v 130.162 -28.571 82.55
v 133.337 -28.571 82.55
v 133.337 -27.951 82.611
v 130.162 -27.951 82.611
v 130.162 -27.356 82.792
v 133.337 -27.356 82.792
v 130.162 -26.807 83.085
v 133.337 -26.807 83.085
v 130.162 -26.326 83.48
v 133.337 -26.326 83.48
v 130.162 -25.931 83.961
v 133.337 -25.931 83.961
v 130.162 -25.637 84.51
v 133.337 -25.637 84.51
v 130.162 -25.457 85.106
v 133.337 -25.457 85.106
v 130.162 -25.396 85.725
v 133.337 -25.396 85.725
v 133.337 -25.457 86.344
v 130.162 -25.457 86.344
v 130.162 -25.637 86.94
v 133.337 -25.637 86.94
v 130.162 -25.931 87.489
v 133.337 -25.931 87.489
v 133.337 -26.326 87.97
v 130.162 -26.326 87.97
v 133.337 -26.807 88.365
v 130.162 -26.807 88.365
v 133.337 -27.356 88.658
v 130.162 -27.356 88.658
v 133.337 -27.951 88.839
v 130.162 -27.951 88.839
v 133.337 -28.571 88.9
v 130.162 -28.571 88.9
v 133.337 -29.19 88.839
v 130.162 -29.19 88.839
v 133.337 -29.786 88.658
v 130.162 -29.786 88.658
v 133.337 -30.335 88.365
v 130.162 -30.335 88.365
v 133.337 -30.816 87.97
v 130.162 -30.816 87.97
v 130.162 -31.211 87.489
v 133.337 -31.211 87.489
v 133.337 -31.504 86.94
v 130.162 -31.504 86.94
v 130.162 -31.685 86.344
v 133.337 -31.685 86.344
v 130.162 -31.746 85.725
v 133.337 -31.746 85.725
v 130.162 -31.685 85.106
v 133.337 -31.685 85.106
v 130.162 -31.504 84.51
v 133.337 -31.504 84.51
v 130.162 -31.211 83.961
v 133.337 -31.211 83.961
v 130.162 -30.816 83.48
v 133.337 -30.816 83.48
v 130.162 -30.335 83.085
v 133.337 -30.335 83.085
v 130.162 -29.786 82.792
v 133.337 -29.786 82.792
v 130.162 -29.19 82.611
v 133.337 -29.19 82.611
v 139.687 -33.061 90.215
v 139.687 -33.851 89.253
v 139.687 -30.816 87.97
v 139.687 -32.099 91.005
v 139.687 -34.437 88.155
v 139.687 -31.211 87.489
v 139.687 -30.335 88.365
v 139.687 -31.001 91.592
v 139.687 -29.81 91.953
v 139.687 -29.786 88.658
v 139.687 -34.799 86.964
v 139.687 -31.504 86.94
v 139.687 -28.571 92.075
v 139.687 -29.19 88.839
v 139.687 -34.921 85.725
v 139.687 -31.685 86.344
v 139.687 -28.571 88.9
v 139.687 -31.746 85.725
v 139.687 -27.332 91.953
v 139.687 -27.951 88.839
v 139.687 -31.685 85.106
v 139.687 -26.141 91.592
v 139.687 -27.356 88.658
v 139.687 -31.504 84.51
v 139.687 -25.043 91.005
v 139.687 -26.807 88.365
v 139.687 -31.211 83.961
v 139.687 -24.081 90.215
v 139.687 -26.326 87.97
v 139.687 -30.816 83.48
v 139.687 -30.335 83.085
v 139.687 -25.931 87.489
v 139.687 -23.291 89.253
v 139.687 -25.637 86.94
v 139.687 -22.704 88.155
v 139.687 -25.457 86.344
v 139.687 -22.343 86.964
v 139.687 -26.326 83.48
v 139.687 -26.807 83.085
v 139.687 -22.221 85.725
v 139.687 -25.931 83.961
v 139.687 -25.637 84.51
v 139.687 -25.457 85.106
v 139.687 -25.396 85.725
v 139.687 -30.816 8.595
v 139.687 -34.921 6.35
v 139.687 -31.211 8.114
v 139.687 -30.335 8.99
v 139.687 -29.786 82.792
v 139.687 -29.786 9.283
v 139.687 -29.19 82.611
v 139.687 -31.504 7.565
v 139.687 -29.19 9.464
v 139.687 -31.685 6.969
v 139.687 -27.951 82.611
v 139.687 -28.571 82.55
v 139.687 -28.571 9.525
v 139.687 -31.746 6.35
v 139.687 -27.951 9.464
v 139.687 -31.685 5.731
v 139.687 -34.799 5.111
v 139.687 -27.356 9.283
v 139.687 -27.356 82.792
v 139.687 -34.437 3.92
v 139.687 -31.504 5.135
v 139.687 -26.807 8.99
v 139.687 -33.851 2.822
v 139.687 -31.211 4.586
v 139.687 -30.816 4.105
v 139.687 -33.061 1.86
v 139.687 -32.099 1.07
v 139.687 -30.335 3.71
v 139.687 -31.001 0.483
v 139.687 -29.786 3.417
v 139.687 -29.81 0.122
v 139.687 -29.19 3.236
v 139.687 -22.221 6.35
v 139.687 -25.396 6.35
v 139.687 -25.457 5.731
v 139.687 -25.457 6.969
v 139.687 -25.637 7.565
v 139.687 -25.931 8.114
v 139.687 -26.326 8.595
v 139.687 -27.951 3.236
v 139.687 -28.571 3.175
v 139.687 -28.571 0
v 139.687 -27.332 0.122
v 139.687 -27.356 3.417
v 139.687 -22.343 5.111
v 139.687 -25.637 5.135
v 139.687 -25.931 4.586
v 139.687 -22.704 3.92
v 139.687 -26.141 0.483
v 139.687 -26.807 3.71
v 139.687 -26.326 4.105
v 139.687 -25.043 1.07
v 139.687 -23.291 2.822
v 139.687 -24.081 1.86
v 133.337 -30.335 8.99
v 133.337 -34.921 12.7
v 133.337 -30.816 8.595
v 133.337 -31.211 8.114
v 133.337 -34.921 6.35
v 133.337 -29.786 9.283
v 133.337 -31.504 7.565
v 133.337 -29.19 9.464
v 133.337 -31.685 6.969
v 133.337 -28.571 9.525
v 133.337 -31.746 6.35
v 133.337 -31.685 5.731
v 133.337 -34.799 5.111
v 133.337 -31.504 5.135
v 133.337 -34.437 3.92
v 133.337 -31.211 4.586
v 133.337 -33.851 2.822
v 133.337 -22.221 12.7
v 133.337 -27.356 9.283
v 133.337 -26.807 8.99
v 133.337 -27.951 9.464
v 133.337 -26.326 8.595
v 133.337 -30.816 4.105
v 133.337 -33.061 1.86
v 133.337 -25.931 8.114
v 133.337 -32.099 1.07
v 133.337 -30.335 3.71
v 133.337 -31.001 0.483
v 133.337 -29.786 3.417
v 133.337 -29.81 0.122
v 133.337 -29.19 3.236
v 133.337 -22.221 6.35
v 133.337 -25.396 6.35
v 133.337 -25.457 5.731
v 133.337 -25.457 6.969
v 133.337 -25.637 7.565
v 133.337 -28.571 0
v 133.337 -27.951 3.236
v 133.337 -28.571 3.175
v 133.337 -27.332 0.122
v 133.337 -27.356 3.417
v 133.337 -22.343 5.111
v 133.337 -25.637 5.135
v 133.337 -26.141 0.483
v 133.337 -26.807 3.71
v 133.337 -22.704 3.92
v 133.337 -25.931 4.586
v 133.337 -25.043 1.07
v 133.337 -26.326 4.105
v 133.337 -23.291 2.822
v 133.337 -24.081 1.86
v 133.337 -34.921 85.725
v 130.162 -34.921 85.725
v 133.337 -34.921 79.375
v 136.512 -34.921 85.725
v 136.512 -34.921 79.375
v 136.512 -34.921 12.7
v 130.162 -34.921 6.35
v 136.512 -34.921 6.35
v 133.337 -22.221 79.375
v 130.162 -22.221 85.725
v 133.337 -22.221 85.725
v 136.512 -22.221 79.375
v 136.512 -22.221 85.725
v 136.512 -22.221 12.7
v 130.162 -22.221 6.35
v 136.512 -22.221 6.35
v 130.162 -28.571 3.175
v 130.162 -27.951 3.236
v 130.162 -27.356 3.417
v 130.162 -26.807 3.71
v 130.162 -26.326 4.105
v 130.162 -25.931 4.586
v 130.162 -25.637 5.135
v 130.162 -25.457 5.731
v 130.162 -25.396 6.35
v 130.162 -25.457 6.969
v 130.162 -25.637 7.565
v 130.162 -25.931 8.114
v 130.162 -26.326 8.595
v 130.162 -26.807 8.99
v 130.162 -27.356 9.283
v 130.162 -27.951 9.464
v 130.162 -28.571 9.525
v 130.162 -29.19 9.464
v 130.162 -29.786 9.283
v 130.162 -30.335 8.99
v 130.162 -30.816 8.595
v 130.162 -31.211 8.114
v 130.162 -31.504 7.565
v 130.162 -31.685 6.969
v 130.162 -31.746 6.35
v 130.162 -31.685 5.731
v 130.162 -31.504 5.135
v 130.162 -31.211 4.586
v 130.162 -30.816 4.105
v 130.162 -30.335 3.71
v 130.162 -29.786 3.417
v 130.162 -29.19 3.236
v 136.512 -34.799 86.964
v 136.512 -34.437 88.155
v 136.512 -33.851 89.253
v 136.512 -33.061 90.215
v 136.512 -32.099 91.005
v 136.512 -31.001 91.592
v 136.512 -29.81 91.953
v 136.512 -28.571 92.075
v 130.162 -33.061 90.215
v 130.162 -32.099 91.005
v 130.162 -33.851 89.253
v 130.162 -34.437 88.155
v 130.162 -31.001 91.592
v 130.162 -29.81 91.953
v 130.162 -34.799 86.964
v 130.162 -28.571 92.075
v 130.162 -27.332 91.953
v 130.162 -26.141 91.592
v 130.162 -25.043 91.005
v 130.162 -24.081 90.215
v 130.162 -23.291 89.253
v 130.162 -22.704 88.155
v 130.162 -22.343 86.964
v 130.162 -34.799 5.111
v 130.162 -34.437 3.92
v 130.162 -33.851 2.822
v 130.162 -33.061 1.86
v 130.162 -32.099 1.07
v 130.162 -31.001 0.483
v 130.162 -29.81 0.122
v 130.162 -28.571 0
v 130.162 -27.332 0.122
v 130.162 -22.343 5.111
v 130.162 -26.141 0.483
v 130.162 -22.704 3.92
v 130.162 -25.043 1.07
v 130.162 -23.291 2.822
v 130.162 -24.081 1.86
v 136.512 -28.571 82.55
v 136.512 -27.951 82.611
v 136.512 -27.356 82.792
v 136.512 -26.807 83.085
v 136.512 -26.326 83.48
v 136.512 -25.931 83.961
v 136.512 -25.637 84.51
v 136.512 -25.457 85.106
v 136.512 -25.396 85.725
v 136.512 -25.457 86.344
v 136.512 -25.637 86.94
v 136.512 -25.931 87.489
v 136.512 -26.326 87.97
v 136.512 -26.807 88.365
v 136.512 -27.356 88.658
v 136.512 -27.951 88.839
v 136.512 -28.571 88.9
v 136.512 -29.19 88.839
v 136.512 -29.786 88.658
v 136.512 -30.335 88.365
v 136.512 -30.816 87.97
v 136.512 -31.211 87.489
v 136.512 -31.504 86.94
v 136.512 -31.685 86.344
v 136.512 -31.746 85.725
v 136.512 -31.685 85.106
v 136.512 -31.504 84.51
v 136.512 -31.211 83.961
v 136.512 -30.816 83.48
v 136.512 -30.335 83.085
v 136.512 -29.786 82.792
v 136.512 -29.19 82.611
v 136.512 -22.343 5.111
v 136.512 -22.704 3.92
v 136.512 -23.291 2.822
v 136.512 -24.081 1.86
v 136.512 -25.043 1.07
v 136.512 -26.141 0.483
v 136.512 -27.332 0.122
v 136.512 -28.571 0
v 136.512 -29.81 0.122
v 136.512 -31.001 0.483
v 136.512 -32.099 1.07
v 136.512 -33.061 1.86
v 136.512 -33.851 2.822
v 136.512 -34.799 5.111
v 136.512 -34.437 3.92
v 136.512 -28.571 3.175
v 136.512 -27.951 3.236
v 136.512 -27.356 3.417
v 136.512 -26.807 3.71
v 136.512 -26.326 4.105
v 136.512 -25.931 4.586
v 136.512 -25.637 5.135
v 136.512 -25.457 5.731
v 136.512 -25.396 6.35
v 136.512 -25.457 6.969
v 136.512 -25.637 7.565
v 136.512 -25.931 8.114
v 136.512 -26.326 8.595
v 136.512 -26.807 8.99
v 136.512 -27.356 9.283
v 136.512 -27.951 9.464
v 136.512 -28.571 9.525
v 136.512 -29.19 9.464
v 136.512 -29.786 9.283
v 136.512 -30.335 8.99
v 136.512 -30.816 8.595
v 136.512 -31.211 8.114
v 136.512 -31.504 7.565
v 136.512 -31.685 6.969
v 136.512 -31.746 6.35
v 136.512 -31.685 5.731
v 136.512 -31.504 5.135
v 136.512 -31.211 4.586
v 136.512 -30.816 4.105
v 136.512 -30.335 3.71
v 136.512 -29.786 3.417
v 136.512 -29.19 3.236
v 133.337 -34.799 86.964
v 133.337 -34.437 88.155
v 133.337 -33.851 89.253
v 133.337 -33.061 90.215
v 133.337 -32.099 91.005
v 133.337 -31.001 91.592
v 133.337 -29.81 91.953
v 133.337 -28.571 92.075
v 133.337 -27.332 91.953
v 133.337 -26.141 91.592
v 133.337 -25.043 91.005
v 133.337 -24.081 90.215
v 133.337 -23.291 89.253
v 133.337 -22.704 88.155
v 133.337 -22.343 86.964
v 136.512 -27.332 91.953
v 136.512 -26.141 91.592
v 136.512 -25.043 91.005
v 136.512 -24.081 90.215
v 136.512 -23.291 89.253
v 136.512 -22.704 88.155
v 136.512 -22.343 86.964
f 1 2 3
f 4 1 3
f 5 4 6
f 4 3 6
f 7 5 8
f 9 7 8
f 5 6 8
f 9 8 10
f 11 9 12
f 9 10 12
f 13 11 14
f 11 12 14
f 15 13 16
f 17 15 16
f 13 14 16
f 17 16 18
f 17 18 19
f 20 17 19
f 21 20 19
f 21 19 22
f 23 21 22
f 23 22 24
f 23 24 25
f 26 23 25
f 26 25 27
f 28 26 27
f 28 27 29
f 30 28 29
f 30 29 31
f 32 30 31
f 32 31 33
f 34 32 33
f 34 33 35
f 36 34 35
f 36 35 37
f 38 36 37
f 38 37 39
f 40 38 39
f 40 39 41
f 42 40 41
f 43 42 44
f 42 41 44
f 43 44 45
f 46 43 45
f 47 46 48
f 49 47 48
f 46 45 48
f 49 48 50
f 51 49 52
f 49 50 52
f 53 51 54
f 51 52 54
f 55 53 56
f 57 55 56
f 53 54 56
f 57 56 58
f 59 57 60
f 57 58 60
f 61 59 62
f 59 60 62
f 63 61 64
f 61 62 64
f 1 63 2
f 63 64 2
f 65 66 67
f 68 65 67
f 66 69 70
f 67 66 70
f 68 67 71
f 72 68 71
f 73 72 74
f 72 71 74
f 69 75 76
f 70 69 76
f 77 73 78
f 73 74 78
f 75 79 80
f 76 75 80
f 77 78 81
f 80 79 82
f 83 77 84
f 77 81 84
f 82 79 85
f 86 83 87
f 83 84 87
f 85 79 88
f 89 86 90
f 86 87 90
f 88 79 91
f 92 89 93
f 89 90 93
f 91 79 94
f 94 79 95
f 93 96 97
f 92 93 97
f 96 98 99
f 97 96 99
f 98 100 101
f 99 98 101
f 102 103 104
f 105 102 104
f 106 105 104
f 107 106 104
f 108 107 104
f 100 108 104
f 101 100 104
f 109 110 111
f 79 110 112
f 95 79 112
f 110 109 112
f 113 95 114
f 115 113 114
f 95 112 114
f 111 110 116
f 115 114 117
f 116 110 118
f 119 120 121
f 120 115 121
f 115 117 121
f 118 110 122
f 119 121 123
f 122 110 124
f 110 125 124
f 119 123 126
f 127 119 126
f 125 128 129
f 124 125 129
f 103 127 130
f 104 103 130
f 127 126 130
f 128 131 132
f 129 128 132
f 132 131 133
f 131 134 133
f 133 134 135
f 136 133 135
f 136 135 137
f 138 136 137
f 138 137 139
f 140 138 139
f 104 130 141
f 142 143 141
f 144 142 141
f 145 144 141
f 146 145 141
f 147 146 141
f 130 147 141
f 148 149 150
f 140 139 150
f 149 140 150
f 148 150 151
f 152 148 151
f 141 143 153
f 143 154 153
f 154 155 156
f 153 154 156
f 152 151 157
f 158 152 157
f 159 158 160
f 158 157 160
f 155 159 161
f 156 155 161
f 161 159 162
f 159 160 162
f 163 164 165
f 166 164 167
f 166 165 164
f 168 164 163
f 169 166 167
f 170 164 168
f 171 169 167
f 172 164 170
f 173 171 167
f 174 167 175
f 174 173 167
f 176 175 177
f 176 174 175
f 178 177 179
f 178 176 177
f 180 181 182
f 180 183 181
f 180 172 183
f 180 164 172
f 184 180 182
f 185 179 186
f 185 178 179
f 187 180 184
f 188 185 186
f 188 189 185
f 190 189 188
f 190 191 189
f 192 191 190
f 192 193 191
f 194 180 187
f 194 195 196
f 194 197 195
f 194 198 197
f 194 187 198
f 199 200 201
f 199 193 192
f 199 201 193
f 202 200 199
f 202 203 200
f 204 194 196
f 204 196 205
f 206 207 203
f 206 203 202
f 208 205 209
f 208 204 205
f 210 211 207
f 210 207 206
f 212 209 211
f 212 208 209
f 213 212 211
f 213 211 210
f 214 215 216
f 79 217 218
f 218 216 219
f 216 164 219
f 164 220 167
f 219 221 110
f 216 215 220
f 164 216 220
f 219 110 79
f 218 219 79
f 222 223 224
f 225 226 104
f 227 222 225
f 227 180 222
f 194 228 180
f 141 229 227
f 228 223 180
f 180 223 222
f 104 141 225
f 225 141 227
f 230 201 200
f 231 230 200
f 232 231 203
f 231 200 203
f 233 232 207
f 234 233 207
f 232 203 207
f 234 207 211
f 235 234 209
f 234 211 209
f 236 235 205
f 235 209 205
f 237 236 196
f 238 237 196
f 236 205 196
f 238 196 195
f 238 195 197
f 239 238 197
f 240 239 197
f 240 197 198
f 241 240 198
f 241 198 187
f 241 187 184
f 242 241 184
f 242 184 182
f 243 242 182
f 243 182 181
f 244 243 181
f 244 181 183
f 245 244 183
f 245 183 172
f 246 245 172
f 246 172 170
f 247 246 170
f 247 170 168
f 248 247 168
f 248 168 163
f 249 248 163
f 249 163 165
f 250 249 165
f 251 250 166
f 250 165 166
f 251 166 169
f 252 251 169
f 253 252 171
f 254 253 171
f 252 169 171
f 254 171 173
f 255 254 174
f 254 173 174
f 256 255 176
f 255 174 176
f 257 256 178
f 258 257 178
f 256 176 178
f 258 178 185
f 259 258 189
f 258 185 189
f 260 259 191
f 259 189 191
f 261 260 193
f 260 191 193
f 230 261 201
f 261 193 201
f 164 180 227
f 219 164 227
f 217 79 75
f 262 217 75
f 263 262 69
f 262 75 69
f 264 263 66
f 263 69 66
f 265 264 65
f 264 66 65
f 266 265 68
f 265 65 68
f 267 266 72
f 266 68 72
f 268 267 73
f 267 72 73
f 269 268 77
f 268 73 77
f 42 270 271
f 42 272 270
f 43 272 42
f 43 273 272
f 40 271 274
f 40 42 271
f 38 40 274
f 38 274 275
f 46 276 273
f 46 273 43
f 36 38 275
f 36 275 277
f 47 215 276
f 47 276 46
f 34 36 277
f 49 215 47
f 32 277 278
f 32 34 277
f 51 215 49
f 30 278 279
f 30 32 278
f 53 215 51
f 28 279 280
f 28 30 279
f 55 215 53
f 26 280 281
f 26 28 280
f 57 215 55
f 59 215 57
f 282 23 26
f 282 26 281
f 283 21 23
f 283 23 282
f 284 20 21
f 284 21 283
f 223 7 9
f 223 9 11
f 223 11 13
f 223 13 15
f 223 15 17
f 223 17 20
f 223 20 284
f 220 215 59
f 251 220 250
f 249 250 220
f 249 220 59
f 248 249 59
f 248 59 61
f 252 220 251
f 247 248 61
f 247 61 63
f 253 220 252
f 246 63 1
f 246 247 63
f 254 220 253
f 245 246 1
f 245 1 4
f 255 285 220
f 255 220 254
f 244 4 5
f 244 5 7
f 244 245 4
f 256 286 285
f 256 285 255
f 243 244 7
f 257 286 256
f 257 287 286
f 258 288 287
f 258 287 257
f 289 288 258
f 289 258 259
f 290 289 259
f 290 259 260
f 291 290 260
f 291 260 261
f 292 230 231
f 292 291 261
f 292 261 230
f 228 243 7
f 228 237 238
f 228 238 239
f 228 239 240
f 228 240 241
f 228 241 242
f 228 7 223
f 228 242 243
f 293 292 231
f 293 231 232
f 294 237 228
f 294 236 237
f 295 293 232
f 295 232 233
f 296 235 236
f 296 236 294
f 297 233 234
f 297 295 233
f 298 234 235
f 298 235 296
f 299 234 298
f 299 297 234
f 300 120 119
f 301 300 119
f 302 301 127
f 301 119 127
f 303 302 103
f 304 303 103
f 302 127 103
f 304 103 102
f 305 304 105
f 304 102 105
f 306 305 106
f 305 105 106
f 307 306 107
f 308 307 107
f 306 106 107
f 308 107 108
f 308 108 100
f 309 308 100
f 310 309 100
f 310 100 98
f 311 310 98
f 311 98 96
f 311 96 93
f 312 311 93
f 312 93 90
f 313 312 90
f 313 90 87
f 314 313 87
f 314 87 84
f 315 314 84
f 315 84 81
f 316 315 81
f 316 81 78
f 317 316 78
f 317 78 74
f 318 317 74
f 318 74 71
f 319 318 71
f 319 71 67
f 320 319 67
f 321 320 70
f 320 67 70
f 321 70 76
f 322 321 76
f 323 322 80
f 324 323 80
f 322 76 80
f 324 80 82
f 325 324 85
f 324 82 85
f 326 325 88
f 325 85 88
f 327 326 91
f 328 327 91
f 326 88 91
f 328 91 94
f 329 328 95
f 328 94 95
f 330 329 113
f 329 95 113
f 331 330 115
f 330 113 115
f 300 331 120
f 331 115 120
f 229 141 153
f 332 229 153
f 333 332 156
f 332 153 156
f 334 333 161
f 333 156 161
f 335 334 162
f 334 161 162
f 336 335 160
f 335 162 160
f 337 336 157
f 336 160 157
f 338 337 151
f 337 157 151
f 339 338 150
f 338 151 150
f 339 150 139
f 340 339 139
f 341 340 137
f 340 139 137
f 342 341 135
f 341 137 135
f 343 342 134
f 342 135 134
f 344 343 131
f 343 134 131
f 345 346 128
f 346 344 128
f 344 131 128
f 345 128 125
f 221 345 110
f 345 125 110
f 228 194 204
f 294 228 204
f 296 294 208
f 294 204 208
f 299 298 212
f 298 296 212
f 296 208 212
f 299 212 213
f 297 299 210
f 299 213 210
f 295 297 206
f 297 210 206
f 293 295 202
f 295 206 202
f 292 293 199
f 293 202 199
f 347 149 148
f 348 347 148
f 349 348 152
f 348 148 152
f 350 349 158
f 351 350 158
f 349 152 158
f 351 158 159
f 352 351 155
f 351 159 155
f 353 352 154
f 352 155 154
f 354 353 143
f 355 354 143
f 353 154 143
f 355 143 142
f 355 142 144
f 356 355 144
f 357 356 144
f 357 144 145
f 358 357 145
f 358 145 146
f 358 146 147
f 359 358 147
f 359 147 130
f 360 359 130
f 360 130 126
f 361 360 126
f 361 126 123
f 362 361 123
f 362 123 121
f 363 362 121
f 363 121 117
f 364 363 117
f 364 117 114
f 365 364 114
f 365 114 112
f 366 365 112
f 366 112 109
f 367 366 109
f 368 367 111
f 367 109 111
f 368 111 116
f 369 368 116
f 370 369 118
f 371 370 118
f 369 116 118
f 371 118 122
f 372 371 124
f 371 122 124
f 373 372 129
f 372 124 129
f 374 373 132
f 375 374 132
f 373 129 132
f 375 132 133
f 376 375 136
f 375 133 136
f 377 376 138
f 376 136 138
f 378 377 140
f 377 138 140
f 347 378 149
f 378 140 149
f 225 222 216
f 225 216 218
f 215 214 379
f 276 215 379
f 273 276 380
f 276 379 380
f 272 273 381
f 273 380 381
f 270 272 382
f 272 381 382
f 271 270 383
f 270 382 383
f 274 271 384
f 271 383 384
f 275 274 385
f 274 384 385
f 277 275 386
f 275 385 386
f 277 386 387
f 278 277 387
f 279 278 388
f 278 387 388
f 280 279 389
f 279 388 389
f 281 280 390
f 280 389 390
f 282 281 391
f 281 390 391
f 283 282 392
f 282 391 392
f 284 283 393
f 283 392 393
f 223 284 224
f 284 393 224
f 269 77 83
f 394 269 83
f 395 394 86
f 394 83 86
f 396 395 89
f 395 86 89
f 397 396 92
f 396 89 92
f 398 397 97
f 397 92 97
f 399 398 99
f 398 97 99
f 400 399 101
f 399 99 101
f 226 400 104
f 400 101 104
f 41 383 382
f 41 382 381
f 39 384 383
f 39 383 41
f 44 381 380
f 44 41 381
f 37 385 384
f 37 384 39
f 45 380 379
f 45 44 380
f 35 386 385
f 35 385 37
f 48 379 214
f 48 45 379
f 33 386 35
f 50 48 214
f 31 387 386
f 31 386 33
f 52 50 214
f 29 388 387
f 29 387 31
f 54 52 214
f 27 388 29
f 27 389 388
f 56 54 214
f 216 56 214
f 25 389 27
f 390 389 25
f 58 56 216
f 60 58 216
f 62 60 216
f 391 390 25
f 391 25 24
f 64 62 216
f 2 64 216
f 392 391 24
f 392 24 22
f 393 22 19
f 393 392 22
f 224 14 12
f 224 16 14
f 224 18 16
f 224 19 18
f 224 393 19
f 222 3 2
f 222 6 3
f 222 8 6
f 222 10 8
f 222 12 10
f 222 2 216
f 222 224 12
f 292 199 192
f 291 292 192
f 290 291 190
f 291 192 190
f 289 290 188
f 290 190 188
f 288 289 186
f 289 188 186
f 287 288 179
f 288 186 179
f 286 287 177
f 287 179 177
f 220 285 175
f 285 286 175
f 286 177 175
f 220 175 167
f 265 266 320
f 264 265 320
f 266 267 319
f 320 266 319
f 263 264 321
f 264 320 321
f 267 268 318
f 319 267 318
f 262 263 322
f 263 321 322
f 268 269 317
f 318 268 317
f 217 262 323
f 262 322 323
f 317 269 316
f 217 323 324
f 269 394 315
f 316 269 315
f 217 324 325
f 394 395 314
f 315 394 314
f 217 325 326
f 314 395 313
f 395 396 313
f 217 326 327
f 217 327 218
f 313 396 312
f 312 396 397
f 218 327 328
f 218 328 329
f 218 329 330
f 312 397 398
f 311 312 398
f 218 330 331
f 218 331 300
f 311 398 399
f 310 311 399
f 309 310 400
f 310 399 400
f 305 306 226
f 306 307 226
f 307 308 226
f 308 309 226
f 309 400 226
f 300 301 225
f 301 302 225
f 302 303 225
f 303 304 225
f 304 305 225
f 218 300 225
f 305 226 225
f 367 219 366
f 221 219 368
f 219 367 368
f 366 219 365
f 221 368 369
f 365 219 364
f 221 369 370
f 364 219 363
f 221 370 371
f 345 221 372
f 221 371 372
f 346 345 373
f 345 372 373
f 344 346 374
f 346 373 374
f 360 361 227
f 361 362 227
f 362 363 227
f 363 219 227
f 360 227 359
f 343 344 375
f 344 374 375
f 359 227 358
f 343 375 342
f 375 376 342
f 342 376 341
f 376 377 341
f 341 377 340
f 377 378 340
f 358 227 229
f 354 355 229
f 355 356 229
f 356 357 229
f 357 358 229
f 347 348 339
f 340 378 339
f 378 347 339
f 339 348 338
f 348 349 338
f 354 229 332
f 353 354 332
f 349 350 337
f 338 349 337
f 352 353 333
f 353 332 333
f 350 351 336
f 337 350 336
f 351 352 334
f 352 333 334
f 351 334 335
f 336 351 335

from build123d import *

# Parameters (mm, degrees)
SKETCH1_W           = 9.525
SKETCH1_H           = 12.7
BOSS_EXTRUDE1_DEPTH = 92.075
SKETCH2_W           = 3.175
SKETCH2_H           = 12.7
CUT_EXTRUDE1_DEPTH  = 168.784366554
SKETCH4_R           = 3.175
CUT_EXTRUDE3_DEPTH  = 99.934266019


with BuildPart() as part:
    # Sketch1 → Boss-Extrude1 (new body)
    with BuildSketch(Plane.XY):
        with Locations((134.924643413, -28.57073514)):
            Rectangle(SKETCH1_W, SKETCH1_H)
    extrude(amount=BOSS_EXTRUDE1_DEPTH)

    # Sketch2 → Cut-Extrude1 (cut, through all)
    with BuildSketch(Plane(origin=(0, -22.22073514, 0), x_dir=(1, 0, 0), z_dir=(0, 1, 0))):
        with Locations((134.924643413, -85.725)):
            Rectangle(SKETCH2_W, SKETCH2_H)
        with Locations((134.924643413, -6.35)):
            Rectangle(SKETCH2_W, SKETCH2_H)
    extrude(amount=-CUT_EXTRUDE1_DEPTH, mode=Mode.SUBTRACT)

    # Sketch4 → Cut-Extrude3 (cut, through all)
    with BuildSketch(Plane(origin=(139.687143413, 0, 0), x_dir=(0, 0, -1), z_dir=(1, 0, 0))):
        with Locations((-6.35, -28.57073514)):
            Circle(SKETCH4_R)
        with BuildLine():
            Line((0, -22.22073514), (-6.35, -22.22073514))
            ThreePointArc((-6.35, -22.22073514), (-1.859871939, -24.080607079), (0, -28.57073514))
            Line((0, -28.57073514), (0, -22.22073514))
        make_face()
        with BuildLine():
            Line((0, -34.92073514), (0, -28.57073514))
            ThreePointArc((0, -28.57073514), (-1.859871939, -33.060863201), (-6.35, -34.92073514))
            Line((-6.35, -34.92073514), (0, -34.92073514))
        make_face()
        with Locations((-85.725, -28.57073514)):
            Circle(SKETCH4_R)
        with BuildLine():
            ThreePointArc((-92.075, -28.57073514), (-90.215128061, -24.080607079), (-85.725, -22.22073514))
            Line((-85.725, -22.22073514), (-92.075, -22.22073514))
            Line((-92.075, -22.22073514), (-92.075, -28.57073514))
        make_face()
        with BuildLine():
            ThreePointArc((-85.725, -34.92073514), (-90.215128061, -33.060863201), (-92.075, -28.57073514))
            Line((-92.075, -28.57073514), (-92.075, -34.92073514))
            Line((-92.075, -34.92073514), (-85.725, -34.92073514))
        make_face()
    extrude(amount=-CUT_EXTRUDE3_DEPTH, mode=Mode.SUBTRACT)


solid = part.part
